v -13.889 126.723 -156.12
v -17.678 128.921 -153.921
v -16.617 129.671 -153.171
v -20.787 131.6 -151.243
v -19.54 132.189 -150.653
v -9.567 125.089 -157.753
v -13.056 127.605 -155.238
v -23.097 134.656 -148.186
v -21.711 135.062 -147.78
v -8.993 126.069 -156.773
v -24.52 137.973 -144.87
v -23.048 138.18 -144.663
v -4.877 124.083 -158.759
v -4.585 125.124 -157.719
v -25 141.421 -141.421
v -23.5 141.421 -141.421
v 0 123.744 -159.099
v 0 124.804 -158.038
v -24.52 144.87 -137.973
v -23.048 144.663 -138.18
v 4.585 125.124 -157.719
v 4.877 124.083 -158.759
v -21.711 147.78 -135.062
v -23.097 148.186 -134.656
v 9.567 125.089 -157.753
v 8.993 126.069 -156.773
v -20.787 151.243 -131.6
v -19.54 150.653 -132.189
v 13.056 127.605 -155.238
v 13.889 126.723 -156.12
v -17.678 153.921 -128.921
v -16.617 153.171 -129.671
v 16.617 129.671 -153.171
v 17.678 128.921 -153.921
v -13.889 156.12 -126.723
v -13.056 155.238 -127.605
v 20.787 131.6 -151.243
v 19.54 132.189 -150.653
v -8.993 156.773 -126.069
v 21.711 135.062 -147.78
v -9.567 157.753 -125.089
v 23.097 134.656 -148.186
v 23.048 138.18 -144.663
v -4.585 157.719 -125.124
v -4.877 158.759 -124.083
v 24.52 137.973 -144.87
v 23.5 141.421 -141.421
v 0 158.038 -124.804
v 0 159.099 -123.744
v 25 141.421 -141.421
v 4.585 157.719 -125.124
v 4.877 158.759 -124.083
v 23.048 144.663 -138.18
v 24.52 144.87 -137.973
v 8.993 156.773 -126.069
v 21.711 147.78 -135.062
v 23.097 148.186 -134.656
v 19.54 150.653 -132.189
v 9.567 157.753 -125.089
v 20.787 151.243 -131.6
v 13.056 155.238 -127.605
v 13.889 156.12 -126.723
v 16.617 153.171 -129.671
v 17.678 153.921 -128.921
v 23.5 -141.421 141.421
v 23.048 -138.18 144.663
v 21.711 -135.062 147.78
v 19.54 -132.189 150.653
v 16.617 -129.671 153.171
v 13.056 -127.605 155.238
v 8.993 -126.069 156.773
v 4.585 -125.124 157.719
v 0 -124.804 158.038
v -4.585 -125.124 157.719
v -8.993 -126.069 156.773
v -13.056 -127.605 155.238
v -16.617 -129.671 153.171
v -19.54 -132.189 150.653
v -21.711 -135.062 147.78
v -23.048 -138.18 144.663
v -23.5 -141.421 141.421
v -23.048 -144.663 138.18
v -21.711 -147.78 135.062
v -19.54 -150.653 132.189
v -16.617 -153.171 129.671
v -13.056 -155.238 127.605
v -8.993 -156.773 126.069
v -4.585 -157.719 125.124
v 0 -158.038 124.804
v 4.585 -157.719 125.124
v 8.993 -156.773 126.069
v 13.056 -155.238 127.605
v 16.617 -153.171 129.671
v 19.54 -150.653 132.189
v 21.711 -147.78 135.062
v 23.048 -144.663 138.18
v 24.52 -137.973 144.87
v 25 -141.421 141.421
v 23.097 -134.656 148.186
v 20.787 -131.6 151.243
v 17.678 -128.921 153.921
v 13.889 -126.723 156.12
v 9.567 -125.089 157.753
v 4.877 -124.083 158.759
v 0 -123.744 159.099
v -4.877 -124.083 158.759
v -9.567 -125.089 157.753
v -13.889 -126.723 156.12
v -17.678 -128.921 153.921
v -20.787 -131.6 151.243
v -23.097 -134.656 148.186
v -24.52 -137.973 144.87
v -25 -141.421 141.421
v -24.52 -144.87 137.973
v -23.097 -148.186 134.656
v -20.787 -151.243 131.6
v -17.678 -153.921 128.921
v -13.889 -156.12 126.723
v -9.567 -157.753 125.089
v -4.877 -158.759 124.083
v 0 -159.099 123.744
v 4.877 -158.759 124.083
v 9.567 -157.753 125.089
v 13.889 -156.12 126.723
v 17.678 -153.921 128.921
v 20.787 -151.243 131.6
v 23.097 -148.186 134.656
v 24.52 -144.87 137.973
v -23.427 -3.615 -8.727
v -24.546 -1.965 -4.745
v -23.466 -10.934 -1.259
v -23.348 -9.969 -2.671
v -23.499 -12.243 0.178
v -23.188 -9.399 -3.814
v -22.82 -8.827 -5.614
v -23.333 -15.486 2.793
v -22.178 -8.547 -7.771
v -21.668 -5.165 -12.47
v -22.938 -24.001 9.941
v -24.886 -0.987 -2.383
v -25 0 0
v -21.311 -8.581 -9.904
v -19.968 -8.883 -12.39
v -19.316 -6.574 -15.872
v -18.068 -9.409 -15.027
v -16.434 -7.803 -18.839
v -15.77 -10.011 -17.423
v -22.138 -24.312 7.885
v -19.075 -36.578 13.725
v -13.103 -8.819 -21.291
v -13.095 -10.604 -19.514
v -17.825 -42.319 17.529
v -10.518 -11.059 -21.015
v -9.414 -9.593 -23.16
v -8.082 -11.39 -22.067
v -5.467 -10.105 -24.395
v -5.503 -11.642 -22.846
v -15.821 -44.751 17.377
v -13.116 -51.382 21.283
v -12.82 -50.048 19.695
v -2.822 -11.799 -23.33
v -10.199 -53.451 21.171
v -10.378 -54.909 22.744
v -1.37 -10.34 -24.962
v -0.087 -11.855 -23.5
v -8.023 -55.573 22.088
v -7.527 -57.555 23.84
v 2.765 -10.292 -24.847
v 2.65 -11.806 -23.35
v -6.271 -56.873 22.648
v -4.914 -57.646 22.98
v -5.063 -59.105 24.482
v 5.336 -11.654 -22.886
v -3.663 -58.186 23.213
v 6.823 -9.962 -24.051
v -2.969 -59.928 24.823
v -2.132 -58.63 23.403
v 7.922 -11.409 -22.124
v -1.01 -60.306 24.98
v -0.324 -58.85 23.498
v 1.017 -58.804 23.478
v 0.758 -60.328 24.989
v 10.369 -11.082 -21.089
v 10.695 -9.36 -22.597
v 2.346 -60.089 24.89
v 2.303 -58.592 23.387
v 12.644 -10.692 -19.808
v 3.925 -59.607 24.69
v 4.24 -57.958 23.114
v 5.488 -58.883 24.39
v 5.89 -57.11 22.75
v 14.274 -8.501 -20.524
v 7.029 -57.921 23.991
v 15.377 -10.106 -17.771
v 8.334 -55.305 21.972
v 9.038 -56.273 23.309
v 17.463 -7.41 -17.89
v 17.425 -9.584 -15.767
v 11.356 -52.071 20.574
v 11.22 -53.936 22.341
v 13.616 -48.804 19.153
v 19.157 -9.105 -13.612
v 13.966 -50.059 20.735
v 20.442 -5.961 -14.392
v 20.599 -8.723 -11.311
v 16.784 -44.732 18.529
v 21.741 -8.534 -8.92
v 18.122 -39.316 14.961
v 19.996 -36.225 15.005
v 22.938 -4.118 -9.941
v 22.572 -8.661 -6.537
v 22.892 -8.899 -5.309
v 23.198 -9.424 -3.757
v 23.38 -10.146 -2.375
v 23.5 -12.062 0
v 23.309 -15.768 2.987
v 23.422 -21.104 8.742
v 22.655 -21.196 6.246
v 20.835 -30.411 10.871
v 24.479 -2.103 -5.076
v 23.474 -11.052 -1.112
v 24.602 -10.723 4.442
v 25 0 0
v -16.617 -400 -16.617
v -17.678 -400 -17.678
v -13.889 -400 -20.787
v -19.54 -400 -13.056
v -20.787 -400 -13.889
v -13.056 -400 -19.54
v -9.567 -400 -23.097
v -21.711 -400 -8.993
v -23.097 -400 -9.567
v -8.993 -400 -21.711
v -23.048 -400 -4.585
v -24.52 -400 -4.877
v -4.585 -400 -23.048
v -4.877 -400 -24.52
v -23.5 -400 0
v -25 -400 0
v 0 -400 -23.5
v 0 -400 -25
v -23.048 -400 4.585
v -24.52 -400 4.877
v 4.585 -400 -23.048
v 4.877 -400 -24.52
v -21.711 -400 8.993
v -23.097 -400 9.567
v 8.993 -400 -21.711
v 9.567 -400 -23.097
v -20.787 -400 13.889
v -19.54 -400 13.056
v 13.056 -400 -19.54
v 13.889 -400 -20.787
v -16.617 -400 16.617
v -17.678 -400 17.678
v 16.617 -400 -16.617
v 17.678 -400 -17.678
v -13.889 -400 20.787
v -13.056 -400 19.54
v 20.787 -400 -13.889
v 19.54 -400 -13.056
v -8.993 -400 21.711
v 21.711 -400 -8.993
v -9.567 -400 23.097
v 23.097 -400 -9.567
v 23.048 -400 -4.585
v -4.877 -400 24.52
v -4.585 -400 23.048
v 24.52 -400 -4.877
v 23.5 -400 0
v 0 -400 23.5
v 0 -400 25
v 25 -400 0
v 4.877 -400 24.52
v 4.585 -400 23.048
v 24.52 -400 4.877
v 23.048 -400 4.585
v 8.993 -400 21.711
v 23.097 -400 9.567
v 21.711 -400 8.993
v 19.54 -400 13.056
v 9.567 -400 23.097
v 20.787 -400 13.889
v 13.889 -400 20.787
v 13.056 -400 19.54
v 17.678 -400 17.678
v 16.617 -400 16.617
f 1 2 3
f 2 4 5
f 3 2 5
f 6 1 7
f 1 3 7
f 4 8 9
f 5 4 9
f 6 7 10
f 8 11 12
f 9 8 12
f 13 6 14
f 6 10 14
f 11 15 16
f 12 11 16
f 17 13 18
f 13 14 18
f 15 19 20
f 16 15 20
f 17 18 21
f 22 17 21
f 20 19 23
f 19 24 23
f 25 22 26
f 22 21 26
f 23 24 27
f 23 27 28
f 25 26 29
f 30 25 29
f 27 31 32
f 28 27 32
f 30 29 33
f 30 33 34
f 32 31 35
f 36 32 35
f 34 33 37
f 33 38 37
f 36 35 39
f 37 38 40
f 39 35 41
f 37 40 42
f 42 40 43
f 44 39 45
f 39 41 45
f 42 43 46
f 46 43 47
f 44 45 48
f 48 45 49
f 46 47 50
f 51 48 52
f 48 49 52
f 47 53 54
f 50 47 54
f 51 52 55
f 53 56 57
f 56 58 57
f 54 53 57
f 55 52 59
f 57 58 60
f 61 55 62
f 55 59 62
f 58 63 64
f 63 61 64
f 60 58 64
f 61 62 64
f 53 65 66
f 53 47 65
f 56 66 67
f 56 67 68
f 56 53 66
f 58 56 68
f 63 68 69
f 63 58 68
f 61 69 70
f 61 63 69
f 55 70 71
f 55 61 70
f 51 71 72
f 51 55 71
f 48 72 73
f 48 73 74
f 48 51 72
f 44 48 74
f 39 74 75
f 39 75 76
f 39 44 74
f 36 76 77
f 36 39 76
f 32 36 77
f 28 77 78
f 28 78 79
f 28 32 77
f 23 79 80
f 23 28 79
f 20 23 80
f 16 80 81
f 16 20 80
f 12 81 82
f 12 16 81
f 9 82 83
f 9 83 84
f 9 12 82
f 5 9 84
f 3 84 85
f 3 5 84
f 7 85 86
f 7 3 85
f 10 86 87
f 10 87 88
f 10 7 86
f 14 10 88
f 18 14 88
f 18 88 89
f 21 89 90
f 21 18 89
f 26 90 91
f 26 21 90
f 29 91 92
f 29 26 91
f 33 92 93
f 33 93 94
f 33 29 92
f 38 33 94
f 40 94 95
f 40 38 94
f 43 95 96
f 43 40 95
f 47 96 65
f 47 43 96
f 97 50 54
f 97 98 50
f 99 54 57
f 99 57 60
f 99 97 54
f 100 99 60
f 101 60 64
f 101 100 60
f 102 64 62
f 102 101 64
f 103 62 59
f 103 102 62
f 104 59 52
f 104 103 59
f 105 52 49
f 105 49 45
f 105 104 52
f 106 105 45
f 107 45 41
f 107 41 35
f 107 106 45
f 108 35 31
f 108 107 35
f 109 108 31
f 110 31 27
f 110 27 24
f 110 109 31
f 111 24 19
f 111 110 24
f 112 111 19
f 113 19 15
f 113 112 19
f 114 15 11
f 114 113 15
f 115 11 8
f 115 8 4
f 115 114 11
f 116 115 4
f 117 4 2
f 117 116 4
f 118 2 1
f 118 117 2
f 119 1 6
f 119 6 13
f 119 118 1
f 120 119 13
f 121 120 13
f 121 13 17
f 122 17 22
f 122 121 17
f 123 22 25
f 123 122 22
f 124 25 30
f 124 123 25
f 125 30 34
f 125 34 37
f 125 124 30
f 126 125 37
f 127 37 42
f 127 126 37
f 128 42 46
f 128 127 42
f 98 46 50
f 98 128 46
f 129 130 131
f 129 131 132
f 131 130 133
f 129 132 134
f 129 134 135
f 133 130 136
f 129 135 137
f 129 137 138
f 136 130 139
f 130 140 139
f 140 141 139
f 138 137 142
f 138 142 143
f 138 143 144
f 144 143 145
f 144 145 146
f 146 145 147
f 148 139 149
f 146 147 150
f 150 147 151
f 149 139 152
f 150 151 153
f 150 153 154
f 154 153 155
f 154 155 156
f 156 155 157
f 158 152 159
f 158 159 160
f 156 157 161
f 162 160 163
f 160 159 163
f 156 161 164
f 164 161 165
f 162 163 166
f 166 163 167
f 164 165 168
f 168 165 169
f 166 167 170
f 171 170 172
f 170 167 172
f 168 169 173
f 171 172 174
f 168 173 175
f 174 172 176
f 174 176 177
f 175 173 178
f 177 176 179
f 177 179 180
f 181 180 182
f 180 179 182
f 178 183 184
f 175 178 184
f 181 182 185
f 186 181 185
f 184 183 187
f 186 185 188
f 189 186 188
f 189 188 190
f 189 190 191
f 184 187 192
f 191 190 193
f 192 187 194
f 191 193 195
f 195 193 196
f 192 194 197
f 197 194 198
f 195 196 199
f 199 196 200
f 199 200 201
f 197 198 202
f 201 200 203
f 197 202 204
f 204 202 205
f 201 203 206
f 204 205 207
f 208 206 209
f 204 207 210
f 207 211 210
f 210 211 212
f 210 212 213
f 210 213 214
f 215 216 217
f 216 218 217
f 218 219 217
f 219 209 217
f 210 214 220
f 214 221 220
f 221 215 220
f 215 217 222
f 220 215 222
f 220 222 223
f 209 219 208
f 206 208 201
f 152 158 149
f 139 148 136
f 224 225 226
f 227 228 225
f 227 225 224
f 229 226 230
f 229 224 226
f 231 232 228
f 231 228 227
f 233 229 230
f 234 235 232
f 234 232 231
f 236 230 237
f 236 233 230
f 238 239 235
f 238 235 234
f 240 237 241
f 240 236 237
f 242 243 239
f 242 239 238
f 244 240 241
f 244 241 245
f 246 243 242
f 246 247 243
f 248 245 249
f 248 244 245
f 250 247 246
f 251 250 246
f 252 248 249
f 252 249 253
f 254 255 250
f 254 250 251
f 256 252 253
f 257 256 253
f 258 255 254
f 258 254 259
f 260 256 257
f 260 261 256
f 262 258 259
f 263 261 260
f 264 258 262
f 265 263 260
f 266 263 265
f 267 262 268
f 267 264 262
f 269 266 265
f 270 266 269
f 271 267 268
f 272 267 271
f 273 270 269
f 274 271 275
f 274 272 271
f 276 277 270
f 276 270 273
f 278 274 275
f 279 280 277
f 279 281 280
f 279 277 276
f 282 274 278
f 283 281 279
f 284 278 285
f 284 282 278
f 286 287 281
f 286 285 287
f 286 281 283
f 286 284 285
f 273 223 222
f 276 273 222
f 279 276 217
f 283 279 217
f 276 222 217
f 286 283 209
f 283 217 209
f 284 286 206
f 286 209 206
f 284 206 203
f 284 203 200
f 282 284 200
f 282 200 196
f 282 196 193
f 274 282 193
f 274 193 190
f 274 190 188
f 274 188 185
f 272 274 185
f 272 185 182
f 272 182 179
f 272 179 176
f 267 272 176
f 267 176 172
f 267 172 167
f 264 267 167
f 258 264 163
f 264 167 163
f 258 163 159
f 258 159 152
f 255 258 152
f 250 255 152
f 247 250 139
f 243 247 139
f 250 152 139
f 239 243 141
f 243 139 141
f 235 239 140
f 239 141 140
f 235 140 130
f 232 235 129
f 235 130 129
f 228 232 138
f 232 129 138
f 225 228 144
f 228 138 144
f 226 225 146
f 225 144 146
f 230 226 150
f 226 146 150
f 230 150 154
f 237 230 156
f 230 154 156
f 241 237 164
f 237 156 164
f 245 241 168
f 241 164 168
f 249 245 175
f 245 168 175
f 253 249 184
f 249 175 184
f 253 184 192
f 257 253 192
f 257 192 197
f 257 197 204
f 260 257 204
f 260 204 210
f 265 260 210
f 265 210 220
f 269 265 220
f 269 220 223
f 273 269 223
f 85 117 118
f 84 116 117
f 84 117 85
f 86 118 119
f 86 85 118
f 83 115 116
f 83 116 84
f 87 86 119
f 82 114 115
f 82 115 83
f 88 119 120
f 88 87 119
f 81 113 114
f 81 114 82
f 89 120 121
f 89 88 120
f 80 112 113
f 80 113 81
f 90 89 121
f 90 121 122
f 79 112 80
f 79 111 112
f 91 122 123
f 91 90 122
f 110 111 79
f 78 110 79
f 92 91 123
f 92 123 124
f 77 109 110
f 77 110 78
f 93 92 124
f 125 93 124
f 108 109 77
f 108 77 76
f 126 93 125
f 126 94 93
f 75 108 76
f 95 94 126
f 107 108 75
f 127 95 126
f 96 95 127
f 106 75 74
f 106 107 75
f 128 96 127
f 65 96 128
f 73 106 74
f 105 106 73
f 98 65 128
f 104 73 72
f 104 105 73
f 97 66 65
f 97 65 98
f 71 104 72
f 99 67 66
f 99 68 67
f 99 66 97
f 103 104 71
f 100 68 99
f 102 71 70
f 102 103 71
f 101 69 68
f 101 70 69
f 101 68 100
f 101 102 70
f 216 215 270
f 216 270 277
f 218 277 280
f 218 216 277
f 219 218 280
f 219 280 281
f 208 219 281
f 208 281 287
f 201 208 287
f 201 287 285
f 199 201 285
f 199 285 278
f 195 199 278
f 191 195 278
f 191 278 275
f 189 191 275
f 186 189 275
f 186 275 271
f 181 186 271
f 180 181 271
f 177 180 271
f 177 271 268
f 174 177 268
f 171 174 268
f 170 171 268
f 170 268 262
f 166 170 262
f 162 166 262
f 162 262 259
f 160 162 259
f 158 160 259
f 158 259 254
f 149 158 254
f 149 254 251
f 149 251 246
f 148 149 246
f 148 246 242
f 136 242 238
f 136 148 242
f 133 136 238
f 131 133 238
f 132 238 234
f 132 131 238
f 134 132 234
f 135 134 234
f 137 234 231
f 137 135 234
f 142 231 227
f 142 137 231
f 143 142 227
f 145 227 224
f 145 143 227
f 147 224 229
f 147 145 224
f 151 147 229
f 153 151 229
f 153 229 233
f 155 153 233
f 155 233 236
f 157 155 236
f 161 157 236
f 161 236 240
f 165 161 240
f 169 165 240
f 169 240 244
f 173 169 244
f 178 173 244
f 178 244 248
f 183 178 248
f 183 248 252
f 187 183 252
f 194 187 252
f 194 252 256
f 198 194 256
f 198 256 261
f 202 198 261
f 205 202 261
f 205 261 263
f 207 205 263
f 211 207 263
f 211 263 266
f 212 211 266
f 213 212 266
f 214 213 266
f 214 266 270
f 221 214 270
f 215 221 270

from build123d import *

# Parameters (mm, degrees)
F0_R     = 25
F0_R_2   = 23.5
F1_DEPTH = 400
F3_R     = 25
F3_R_2   = 23.5
F4_DEPTH = 100
F5_DEPTH = 200


with BuildPart() as f1:
    # F0 (on Front) → F1 (new body)
    with BuildSketch(Plane.XZ):
        Circle(F0_R)
        Circle(F0_R_2, mode=Mode.SUBTRACT)
    extrude(amount=F1_DEPTH)

    # F3 (on face) → F4 (cut, symmetric)
    with BuildSketch(Plane(origin=(0, 0, 0), x_dir=(1, 0, 0), z_dir=(0, -0.707107, 0.707107))):
        Circle(F3_R)
        Circle(F3_R_2, mode=Mode.SUBTRACT)
        Circle(F3_R_2)
    extrude(amount=F4_DEPTH, both=True, mode=Mode.SUBTRACT)


with BuildPart() as f5:
    # F3 (on face) → F5 (new body, symmetric)
    with BuildSketch(Plane(origin=(0, 0, 0), x_dir=(1, 0, 0), z_dir=(0, -0.707107, 0.707107))):
        Circle(F3_R)
        Circle(F3_R_2, mode=Mode.SUBTRACT)
    extrude(amount=F5_DEPTH, both=True)


solid = Compound([f1.part, f5.part])
